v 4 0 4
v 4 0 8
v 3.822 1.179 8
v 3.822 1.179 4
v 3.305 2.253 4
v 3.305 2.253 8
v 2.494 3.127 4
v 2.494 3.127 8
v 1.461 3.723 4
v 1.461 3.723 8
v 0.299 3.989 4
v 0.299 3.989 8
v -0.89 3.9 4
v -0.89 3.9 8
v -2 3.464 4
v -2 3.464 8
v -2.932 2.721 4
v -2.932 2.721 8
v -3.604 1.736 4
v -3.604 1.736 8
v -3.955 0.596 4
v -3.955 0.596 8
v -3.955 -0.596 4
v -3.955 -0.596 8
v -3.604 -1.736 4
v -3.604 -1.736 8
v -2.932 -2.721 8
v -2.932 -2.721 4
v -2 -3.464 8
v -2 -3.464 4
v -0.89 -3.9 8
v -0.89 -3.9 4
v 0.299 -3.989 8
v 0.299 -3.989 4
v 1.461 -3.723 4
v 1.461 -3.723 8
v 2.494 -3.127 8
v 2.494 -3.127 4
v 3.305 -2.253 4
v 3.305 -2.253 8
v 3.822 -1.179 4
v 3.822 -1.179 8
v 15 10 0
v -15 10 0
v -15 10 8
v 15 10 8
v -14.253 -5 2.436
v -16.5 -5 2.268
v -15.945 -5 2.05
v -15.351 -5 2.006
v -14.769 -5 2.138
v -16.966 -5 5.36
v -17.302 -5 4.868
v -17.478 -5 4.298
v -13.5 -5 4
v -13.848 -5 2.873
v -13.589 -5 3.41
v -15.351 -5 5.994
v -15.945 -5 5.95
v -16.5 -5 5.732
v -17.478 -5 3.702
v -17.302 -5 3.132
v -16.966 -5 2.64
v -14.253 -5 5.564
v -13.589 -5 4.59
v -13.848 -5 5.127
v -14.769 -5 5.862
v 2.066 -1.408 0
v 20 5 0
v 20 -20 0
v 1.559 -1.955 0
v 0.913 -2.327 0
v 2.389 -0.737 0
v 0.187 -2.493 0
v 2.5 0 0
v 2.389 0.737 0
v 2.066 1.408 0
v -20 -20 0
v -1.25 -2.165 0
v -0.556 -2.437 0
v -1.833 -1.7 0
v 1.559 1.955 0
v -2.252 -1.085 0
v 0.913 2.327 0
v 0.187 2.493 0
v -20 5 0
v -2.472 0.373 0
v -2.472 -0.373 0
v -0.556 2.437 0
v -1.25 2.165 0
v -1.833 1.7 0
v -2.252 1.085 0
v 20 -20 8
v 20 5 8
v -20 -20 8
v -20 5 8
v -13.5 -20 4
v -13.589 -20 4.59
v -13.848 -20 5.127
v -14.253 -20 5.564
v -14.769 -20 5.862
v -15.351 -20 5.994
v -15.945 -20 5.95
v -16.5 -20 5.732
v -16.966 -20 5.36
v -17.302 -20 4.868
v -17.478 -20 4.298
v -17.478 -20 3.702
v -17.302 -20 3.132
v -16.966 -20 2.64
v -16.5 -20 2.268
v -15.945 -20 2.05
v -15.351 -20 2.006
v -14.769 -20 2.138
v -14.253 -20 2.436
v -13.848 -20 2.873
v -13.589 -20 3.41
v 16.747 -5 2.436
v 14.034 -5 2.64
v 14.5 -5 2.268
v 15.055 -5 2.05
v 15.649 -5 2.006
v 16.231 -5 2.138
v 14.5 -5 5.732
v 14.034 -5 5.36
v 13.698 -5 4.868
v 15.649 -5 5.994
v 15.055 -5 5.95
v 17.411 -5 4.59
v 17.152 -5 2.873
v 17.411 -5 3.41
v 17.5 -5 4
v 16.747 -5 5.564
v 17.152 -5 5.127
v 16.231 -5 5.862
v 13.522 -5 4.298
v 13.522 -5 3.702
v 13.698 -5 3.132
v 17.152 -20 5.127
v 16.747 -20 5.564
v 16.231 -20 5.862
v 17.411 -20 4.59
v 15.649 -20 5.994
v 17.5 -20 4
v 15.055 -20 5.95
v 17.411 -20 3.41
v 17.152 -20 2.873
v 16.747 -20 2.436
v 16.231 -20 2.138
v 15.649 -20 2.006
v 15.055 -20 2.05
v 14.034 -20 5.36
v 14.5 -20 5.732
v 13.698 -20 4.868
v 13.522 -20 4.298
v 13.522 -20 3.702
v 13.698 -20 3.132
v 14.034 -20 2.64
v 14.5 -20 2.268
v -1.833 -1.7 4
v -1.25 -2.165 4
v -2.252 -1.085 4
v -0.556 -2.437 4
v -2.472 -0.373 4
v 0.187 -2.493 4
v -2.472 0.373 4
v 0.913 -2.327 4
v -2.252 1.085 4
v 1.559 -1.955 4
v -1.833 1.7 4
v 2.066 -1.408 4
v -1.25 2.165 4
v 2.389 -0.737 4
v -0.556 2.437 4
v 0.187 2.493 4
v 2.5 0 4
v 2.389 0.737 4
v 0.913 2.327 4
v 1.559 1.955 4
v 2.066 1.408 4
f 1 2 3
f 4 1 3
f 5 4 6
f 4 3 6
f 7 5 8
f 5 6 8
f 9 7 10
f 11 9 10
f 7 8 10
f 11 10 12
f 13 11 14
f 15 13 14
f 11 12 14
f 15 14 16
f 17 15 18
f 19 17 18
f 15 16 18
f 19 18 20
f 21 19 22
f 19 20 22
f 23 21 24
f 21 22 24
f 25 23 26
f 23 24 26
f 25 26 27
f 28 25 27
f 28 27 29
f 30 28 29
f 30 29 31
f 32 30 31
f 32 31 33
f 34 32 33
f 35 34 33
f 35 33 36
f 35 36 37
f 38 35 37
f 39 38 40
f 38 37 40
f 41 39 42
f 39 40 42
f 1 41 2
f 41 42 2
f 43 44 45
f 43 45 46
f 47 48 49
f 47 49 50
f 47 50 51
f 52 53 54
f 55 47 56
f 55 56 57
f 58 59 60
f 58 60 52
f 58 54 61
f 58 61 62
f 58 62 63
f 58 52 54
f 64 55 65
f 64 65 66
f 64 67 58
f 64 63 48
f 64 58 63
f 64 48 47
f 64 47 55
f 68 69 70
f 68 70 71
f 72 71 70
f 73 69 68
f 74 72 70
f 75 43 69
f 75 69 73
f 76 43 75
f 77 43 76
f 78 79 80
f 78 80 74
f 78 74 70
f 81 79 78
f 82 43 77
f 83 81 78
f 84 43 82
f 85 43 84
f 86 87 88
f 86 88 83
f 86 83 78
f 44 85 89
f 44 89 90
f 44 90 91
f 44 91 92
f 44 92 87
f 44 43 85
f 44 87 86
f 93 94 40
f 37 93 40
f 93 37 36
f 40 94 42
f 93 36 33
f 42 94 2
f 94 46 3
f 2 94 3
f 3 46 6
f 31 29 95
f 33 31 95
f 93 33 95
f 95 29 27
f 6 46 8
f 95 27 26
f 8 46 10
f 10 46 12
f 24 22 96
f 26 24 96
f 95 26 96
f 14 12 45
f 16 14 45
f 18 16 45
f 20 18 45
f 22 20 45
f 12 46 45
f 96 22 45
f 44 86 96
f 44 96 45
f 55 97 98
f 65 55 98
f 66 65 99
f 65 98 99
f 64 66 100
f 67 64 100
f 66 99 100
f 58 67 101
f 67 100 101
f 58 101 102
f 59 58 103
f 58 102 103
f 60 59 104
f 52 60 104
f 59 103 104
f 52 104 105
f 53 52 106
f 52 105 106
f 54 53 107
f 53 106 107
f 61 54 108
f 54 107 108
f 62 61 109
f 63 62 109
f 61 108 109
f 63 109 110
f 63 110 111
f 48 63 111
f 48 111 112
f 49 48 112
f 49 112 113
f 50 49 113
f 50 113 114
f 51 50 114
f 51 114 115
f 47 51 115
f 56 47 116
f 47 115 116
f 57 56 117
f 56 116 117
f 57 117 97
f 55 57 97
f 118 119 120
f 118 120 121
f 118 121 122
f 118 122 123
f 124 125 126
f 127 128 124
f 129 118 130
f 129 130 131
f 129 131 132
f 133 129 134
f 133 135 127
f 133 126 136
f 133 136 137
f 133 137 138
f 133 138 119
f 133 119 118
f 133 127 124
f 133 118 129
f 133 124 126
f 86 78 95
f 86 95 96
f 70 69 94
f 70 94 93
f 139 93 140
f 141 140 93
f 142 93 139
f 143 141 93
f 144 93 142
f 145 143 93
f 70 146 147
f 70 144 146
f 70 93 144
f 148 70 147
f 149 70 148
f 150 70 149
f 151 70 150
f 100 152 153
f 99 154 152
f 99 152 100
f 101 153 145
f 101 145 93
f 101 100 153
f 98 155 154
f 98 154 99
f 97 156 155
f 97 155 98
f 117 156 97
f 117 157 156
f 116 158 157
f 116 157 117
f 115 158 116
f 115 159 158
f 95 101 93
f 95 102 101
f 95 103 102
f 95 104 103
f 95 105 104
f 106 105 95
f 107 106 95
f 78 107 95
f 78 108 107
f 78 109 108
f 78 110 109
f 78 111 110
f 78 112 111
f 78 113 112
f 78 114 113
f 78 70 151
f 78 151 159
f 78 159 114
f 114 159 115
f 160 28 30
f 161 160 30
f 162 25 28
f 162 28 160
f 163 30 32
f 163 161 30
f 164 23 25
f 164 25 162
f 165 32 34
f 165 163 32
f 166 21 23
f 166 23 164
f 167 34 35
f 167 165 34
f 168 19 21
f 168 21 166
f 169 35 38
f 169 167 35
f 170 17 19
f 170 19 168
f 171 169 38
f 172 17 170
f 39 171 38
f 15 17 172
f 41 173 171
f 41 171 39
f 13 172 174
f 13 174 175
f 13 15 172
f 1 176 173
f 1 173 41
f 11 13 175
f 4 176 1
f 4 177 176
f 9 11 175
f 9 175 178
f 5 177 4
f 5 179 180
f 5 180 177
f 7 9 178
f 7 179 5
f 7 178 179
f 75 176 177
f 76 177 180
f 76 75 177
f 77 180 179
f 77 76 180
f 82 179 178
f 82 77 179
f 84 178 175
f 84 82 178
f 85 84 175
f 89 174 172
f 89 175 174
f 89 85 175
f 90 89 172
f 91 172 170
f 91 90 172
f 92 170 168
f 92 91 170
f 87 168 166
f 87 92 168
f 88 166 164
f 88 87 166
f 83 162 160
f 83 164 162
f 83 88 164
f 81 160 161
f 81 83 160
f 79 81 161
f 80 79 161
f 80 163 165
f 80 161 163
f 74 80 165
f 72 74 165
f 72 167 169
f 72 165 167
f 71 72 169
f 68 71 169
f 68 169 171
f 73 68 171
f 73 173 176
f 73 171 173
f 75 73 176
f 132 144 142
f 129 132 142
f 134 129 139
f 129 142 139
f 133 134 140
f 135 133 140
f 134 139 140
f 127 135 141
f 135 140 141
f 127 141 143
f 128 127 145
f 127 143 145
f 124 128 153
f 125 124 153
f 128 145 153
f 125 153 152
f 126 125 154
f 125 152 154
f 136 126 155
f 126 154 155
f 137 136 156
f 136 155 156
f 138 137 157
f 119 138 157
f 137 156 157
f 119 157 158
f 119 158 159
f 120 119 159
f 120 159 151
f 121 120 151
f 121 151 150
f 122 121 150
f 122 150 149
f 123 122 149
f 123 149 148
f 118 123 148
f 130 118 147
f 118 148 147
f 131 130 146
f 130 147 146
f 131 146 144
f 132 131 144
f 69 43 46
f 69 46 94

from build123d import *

# Parameters (mm, degrees)
ESQUISSE1_R      = 2.5
EXTRUSION1_DEPTH = 8
ESQUISSE2_R      = 4
EXTRUSION2_DEPTH = 4
ESQUISSE3_R      = 2
EXTRUSION3_DEPTH = 15


with BuildPart() as part:
    # Esquisse1 → Extrusion1 (new body)
    with BuildSketch(Plane.XY):
        Polygon((-20, -20), (-20, 5), (-15, 10), (15, 10), (20, 5), (20, -20), align=None)
        Circle(ESQUISSE1_R, mode=Mode.SUBTRACT)
    extrude(amount=EXTRUSION1_DEPTH)

    # Esquisse2 → Extrusion2 (cut)
    with BuildSketch(Plane.XY.offset(8)):
        Circle(ESQUISSE2_R)
    extrude(amount=-EXTRUSION2_DEPTH, mode=Mode.SUBTRACT)

    # Esquisse3 → Extrusion3 (cut)
    with BuildSketch(Plane.XZ.offset(20)):
        with Locations((-15.5, 4)):
            Circle(ESQUISSE3_R)
        with Locations((15.5, 4)):
            Circle(ESQUISSE3_R)
    extrude(amount=-EXTRUSION3_DEPTH, mode=Mode.SUBTRACT)


solid = part.part
